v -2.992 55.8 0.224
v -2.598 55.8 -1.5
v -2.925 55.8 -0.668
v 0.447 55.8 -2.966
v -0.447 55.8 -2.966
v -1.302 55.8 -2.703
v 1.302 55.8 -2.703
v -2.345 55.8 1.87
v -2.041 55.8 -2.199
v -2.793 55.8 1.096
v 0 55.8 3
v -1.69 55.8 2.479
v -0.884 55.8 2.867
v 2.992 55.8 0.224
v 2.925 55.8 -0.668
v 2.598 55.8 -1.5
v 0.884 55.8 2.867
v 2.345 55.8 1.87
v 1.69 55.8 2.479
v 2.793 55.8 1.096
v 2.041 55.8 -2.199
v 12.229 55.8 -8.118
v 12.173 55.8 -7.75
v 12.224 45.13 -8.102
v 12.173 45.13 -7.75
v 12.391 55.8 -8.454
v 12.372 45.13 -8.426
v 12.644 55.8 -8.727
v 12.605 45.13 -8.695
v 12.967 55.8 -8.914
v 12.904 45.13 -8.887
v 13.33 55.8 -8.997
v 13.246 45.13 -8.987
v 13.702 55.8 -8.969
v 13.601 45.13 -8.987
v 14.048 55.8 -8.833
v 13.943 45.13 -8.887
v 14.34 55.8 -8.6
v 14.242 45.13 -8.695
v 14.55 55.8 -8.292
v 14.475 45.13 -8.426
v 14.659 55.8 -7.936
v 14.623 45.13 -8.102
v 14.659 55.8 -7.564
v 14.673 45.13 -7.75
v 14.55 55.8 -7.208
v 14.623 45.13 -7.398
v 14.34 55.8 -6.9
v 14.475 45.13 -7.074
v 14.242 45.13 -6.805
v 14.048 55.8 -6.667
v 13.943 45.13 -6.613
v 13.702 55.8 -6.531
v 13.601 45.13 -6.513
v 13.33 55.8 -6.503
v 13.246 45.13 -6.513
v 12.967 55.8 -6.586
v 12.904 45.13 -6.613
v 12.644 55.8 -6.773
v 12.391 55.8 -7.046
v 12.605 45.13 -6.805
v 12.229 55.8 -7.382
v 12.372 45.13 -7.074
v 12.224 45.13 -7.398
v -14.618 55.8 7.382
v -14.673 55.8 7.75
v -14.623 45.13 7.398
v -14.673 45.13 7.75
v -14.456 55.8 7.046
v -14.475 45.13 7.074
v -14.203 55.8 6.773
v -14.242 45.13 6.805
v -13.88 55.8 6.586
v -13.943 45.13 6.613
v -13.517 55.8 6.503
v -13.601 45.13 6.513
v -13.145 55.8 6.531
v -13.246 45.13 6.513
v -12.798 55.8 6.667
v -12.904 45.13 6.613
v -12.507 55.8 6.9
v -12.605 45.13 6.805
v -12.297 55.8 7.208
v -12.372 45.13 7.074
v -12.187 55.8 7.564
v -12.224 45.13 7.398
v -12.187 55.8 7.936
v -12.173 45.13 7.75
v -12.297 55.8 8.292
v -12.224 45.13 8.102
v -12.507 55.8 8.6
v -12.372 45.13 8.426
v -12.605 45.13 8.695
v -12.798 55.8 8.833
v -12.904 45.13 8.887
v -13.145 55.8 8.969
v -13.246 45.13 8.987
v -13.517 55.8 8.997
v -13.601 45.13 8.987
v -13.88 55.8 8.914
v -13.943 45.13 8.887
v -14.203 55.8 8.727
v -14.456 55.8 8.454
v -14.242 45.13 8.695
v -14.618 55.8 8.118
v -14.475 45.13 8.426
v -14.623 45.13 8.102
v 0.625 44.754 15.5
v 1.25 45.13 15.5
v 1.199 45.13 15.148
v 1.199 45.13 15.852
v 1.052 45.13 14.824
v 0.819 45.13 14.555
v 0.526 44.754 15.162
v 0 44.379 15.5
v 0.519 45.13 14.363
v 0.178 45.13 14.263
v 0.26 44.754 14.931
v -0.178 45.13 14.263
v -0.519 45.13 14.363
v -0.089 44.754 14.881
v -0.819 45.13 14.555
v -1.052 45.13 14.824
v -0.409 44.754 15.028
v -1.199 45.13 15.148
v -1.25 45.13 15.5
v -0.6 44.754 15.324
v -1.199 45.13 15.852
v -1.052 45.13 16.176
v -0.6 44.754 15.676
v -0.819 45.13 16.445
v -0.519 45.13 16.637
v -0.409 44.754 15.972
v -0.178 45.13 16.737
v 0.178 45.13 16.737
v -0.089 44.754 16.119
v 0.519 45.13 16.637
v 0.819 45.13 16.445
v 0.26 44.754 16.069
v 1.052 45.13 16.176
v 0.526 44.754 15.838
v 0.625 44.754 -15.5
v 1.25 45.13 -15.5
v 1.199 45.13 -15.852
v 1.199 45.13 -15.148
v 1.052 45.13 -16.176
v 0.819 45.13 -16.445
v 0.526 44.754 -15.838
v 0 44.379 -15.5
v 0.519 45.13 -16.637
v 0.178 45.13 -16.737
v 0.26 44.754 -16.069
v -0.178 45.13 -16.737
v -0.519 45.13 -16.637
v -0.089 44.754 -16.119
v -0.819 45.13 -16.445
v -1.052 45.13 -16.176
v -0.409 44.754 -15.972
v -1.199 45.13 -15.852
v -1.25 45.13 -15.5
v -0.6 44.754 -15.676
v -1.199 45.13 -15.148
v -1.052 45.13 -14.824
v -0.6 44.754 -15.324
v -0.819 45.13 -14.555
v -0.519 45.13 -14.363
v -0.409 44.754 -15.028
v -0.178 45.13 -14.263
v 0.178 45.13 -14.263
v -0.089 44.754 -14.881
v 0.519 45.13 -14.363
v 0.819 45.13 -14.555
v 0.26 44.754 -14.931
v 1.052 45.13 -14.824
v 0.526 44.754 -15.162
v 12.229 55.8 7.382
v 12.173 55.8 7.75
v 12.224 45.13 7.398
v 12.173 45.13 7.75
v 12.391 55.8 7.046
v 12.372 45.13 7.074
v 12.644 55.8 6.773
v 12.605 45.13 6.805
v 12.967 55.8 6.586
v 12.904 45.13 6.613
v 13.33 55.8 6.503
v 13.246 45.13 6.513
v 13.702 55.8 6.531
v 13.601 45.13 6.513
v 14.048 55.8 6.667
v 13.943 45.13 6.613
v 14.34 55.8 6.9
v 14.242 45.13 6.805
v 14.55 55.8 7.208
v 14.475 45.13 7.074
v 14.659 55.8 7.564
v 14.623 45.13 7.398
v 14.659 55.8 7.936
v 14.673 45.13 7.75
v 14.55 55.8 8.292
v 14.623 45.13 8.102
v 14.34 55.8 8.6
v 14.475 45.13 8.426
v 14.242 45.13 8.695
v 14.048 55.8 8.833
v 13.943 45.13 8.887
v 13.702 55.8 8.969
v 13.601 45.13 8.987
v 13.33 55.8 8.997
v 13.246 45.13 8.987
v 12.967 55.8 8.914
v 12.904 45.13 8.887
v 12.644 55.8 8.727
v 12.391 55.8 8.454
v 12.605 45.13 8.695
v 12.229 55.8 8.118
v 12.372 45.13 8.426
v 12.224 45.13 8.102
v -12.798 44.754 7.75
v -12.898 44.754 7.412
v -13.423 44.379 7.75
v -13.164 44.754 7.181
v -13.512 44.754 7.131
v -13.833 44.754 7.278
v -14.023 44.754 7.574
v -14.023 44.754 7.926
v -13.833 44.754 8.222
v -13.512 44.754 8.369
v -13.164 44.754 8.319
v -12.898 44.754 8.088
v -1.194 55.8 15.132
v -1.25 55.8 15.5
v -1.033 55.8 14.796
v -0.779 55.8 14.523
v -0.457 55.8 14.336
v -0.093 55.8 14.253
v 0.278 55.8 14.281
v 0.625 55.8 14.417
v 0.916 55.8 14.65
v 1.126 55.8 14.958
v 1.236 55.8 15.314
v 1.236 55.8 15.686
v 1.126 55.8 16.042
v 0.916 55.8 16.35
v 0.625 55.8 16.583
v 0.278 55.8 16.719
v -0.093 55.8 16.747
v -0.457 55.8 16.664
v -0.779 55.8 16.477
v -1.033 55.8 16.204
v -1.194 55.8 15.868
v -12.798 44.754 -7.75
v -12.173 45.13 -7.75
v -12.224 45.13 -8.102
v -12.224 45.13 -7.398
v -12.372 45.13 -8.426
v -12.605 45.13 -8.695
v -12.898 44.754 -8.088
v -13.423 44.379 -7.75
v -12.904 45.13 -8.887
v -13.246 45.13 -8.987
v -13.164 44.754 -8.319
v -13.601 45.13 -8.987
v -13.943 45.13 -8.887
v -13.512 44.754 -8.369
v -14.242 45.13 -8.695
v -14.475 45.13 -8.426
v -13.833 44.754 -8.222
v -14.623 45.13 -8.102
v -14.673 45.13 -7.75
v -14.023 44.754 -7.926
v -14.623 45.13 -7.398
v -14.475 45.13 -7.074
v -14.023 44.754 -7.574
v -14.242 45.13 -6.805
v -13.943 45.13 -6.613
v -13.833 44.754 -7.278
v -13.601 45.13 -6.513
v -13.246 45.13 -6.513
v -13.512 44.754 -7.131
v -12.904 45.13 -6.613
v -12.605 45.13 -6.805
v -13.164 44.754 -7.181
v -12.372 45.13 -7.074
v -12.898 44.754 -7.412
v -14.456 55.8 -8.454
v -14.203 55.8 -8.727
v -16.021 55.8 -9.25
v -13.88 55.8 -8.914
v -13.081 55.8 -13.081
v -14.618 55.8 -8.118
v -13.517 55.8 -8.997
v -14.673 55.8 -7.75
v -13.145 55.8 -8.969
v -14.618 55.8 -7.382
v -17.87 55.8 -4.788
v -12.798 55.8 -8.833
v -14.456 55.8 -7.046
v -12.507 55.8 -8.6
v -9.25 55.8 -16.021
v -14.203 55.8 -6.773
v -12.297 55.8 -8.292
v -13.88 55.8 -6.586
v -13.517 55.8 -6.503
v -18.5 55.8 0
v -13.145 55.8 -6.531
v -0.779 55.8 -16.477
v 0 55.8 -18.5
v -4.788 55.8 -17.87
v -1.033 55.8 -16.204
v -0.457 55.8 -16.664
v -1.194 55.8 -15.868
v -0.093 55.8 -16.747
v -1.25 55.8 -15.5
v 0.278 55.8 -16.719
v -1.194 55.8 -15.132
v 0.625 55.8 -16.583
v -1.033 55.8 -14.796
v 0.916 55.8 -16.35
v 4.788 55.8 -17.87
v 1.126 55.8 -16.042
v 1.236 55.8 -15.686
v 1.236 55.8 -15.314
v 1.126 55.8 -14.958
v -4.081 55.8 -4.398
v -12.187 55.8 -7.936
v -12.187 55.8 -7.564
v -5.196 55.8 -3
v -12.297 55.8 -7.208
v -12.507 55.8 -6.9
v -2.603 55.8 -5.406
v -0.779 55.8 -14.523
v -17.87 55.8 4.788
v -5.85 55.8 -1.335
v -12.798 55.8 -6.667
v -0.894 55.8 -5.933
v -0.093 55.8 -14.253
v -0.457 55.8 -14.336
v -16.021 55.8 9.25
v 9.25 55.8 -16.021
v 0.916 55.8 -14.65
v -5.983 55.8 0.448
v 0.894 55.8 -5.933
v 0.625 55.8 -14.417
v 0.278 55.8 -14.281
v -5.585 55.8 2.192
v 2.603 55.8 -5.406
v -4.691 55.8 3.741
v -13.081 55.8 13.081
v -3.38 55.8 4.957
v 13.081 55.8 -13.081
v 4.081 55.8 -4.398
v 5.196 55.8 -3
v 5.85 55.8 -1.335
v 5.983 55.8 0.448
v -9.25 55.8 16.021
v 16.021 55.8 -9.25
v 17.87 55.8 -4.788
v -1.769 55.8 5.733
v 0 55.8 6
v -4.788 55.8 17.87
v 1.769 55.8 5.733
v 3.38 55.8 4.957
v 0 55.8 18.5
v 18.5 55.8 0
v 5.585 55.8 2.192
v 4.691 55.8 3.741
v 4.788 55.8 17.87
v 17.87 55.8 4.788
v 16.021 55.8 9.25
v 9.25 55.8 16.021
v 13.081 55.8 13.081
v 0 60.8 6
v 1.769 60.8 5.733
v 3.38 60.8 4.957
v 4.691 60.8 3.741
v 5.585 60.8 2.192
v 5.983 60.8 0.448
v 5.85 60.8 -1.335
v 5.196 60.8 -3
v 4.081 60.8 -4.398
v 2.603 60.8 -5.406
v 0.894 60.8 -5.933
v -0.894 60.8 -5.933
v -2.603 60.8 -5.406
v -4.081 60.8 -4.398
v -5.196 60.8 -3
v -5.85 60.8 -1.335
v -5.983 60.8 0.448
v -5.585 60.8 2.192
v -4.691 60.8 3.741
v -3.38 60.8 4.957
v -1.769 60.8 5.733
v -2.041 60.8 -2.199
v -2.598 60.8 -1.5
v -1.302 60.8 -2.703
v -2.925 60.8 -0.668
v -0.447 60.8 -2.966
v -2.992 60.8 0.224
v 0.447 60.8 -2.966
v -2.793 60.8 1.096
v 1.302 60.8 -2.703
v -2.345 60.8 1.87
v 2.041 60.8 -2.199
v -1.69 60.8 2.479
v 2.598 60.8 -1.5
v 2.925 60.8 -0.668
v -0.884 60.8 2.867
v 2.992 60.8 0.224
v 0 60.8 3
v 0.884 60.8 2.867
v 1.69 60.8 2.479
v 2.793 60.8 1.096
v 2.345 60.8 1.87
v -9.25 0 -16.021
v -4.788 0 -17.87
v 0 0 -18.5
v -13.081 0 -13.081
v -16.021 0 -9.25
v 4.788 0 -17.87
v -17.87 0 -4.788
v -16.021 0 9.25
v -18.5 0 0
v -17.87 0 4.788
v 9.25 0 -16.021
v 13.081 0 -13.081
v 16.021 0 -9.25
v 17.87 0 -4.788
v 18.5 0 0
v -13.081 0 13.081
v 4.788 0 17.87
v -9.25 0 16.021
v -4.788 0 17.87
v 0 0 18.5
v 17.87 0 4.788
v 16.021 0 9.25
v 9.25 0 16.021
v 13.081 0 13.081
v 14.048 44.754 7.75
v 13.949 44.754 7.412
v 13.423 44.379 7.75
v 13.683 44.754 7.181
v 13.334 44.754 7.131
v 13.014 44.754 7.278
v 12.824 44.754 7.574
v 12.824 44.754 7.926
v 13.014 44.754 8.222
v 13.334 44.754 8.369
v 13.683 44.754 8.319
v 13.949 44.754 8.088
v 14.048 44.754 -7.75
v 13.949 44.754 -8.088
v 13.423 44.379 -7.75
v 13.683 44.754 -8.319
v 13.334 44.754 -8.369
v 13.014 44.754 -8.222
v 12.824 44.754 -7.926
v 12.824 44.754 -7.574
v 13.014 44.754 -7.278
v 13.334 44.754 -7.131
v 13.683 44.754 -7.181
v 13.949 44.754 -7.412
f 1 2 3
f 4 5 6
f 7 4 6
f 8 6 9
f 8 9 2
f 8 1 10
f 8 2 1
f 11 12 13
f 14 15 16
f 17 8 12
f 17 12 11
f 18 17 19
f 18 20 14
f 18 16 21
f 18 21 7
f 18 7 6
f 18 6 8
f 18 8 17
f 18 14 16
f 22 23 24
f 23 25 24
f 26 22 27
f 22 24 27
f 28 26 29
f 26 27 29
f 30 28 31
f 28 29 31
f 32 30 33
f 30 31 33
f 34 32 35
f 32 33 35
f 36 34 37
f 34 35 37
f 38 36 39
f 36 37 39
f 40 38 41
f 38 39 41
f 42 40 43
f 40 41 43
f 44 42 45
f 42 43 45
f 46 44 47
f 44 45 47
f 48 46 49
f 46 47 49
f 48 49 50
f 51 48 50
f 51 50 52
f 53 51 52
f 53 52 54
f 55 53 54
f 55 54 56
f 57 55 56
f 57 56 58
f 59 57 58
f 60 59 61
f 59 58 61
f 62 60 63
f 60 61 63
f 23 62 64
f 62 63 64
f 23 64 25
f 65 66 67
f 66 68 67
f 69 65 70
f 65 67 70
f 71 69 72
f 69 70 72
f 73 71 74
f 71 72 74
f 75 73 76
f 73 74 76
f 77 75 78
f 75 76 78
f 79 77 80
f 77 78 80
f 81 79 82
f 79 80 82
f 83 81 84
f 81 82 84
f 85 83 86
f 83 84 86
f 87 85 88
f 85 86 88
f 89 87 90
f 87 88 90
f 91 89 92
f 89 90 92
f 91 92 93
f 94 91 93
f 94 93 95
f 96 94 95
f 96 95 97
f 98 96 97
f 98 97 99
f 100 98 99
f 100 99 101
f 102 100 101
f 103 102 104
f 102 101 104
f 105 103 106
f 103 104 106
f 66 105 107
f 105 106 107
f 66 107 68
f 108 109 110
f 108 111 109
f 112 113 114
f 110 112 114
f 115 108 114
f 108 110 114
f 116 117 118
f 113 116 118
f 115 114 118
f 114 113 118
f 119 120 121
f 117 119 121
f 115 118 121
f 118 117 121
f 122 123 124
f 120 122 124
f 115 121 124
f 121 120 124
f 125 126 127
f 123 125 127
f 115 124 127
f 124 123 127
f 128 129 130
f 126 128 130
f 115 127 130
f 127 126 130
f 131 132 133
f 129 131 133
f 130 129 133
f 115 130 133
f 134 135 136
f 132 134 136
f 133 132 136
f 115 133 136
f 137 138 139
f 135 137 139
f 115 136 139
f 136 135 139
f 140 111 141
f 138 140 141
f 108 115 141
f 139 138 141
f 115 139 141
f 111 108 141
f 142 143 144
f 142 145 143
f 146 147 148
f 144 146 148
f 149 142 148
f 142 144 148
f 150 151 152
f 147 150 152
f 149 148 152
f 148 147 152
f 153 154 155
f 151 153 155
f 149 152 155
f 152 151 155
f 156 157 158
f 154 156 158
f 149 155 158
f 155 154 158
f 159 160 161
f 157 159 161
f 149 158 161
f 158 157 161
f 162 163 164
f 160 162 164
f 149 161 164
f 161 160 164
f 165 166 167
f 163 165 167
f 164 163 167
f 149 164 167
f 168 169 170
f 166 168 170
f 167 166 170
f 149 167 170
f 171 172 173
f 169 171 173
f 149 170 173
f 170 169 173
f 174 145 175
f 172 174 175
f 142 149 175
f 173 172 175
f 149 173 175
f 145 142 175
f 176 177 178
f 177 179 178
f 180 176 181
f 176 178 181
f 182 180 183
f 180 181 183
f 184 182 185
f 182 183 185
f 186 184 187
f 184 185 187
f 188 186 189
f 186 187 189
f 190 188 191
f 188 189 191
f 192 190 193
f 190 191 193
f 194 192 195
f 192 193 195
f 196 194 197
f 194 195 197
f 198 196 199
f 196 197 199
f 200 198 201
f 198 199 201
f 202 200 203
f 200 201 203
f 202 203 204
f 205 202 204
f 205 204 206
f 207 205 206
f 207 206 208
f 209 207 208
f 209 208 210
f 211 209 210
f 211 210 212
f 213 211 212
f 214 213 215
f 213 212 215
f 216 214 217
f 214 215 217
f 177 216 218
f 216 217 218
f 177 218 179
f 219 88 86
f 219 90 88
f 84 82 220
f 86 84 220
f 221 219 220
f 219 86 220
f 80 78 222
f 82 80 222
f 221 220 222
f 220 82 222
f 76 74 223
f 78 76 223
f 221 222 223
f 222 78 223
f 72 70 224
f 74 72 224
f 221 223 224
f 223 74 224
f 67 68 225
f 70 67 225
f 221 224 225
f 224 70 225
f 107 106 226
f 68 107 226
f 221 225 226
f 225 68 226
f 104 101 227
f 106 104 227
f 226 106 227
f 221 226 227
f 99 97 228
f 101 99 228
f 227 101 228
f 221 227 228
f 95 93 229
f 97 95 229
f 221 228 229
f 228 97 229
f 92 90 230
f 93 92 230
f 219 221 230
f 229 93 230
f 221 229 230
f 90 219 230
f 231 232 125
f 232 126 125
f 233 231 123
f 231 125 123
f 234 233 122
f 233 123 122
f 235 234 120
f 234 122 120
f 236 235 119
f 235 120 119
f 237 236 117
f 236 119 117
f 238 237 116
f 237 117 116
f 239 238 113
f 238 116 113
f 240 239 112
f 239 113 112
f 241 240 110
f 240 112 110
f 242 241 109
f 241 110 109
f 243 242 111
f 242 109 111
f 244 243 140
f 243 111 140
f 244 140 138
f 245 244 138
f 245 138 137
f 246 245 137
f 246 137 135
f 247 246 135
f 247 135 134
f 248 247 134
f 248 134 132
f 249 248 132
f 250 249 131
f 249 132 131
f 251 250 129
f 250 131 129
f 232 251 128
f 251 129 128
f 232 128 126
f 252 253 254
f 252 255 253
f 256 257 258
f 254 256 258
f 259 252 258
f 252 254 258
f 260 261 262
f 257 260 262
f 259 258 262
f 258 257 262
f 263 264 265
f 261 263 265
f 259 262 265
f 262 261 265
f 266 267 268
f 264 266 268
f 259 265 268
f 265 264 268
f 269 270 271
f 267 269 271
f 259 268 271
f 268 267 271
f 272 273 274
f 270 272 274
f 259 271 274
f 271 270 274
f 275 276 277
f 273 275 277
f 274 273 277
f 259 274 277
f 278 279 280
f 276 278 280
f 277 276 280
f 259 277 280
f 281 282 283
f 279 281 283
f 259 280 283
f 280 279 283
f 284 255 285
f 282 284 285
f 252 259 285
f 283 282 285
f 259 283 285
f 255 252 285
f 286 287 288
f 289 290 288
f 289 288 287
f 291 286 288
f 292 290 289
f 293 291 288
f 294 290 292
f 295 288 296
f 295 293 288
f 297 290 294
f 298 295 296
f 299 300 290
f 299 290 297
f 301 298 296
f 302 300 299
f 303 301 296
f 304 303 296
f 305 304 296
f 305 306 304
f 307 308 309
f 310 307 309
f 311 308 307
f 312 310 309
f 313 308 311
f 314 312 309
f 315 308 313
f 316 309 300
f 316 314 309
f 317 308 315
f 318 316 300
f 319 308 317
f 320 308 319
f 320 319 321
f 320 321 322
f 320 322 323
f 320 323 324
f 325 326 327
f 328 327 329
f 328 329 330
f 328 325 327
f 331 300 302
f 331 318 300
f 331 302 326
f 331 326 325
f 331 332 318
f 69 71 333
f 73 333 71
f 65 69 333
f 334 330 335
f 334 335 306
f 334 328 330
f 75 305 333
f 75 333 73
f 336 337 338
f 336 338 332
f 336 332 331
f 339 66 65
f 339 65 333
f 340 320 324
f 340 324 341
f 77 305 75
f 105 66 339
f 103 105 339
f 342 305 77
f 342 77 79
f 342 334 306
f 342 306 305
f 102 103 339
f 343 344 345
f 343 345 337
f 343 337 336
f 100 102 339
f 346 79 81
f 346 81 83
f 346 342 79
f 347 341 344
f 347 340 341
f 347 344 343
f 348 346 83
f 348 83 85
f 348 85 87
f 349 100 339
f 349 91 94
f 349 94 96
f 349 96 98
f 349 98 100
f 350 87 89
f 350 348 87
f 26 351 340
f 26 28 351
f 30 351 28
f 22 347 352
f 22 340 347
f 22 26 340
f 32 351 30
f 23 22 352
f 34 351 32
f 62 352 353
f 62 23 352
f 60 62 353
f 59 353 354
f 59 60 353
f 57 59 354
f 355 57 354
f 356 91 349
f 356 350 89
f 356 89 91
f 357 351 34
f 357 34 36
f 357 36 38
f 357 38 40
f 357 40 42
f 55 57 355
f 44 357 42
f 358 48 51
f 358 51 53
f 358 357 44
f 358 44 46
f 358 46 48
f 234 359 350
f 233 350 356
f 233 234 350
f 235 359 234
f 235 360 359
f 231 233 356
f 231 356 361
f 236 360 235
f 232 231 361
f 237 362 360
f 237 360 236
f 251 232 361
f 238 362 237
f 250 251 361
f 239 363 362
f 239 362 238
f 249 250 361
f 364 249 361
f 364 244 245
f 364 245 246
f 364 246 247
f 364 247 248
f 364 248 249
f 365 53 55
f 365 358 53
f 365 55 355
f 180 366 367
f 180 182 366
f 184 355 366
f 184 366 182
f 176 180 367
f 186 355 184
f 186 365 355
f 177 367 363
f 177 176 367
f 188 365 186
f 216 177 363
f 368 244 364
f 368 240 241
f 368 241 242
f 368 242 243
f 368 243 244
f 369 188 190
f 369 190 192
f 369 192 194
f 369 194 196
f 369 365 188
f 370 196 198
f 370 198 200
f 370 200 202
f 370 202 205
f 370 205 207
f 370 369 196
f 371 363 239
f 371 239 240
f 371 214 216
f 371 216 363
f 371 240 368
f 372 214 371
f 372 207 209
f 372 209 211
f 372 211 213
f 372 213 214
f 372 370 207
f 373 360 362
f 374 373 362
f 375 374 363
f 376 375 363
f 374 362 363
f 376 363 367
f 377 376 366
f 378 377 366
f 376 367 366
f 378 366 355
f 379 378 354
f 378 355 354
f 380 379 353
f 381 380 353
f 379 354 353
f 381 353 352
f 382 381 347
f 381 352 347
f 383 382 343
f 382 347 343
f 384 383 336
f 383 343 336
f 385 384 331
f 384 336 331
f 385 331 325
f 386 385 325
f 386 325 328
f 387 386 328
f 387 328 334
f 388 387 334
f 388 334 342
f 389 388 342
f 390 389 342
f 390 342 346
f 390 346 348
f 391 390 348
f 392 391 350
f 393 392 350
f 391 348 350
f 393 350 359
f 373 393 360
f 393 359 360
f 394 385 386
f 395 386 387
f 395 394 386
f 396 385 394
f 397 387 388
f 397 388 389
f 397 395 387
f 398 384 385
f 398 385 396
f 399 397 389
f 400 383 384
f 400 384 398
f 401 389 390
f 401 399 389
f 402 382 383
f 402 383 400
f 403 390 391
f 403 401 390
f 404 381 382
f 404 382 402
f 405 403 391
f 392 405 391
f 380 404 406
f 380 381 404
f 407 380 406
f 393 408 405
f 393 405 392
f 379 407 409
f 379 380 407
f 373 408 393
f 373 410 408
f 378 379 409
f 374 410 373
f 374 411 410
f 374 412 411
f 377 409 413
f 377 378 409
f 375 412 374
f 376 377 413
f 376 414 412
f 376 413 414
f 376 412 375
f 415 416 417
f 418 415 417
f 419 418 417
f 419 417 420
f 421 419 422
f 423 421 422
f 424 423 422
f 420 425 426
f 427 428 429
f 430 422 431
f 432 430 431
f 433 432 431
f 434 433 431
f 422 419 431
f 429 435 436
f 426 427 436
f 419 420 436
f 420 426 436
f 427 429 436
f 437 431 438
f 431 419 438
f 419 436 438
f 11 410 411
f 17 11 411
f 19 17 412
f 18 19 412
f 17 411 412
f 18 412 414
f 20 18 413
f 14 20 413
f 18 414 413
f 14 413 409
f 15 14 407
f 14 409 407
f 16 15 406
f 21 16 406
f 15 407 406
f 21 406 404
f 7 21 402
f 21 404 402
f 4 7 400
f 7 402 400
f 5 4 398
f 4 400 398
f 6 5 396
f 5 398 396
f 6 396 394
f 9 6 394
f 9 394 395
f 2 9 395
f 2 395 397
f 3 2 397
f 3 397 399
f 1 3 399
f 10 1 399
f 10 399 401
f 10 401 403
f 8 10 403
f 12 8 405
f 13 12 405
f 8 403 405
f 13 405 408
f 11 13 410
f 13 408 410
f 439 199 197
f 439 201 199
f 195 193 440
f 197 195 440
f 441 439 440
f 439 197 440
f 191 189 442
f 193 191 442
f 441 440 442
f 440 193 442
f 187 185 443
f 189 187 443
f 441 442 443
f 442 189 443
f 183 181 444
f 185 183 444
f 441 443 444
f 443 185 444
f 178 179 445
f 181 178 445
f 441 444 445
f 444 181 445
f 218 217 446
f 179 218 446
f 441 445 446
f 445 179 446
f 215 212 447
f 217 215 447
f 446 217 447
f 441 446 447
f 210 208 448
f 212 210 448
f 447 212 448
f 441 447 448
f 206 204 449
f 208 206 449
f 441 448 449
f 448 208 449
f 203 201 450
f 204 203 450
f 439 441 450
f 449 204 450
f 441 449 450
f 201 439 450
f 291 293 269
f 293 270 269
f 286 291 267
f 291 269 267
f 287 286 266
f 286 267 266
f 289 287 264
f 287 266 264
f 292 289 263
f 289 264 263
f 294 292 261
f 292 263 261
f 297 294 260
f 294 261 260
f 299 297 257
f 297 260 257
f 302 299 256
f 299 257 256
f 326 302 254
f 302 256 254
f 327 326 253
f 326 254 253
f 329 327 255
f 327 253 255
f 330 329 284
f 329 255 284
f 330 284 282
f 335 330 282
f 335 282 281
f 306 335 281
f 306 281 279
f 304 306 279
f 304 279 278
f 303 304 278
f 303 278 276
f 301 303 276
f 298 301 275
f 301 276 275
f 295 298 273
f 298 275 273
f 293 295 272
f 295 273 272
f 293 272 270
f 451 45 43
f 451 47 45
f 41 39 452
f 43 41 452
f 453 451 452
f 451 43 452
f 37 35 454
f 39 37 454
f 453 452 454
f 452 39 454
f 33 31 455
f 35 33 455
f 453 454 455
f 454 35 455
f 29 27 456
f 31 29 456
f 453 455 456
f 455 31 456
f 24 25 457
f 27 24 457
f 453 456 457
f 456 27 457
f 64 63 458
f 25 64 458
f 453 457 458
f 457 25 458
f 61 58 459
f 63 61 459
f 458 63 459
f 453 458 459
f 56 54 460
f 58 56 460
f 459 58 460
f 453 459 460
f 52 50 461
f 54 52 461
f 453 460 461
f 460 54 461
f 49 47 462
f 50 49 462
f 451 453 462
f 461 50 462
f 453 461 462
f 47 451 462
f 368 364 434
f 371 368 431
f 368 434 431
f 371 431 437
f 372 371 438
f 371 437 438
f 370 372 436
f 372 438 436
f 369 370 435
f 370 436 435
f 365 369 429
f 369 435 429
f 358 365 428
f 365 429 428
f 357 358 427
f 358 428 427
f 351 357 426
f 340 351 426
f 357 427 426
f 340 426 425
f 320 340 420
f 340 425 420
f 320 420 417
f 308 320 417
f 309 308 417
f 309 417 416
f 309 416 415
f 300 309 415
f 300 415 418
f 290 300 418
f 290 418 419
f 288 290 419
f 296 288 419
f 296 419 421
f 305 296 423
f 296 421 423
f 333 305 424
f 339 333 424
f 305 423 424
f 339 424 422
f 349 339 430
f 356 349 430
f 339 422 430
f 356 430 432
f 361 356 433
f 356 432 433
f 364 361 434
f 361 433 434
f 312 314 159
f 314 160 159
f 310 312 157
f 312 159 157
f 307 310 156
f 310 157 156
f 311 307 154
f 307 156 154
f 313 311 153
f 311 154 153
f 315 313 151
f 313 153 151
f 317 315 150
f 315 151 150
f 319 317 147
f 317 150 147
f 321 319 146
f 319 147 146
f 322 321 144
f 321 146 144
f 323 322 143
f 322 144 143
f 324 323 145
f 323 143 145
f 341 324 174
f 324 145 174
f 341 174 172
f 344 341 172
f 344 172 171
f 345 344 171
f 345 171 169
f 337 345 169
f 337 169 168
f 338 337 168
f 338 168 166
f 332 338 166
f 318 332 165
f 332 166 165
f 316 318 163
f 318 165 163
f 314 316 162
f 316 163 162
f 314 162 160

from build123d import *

# Parameters (mm, degrees)
SKETCH1_R                 = 18.5
BOSS_EXTRUDE1_DEPTH       = 55.8
SKETCH2_R                 = 6
BOSS_EXTRUDE2_DEPTH       = 5
M3X0_5_TAPPED_HOLE1_D     = 2.5
M3X0_5_TAPPED_HOLE1_DEPTH = 10.67
M3X0_5_TAPPED_HOLE1_TIP   = 0.751075774
SKETCH8_R                 = 3
CUT_EXTRUDE1_DEPTH        = 5


with BuildPart() as part:
    # Sketch1 → Boss-Extrude1 (new body)
    with BuildSketch(Plane(origin=(0, 0, 0), x_dir=(1, 0, 0), z_dir=(0, 1, 0))):
        with Locations(Location((0, 0, 0), (0, 0, 270))):
            Circle(SKETCH1_R)
    extrude(amount=BOSS_EXTRUDE1_DEPTH)

    # Sketch2 → Boss-Extrude2 (add)
    with BuildSketch(Plane(origin=(0, 55.8, 0), x_dir=(1, 0, 0), z_dir=(0, 1, 0))):
        with Locations(Location((0, 0, 0), (0, 0, 270))):
            Circle(SKETCH2_R)
    extrude(amount=BOSS_EXTRUDE2_DEPTH)

    # M3x0.5 Tapped Hole1
    with Locations(Plane(origin=(0, 55.8, 0), x_dir=(1, 0, 0), z_dir=(0, 1, 0))):
        with Locations((0, 15.5), (13.423393759, 7.75), (13.423393759, -7.75), (0, -15.5), (-13.423393759, -7.75), (-13.423393759, 7.75)):
            Hole(M3X0_5_TAPPED_HOLE1_D / 2, depth=M3X0_5_TAPPED_HOLE1_DEPTH)
            with Locations((0, 0, -(M3X0_5_TAPPED_HOLE1_DEPTH + M3X0_5_TAPPED_HOLE1_TIP / 2))):  # 118° drill point
                Cone(0, M3X0_5_TAPPED_HOLE1_D / 2, M3X0_5_TAPPED_HOLE1_TIP, mode=Mode.SUBTRACT)

    # Sketch8 → Cut-Extrude1 (cut)
    with BuildSketch(Plane(origin=(0, 60.8, 0), x_dir=(1, 0, 0), z_dir=(0, 1, 0))):
        with Locations(Location((0, 0, 0), (0, 0, 270))):
            Circle(SKETCH8_R)
    extrude(amount=-CUT_EXTRUDE1_DEPTH, mode=Mode.SUBTRACT)


solid = part.part
